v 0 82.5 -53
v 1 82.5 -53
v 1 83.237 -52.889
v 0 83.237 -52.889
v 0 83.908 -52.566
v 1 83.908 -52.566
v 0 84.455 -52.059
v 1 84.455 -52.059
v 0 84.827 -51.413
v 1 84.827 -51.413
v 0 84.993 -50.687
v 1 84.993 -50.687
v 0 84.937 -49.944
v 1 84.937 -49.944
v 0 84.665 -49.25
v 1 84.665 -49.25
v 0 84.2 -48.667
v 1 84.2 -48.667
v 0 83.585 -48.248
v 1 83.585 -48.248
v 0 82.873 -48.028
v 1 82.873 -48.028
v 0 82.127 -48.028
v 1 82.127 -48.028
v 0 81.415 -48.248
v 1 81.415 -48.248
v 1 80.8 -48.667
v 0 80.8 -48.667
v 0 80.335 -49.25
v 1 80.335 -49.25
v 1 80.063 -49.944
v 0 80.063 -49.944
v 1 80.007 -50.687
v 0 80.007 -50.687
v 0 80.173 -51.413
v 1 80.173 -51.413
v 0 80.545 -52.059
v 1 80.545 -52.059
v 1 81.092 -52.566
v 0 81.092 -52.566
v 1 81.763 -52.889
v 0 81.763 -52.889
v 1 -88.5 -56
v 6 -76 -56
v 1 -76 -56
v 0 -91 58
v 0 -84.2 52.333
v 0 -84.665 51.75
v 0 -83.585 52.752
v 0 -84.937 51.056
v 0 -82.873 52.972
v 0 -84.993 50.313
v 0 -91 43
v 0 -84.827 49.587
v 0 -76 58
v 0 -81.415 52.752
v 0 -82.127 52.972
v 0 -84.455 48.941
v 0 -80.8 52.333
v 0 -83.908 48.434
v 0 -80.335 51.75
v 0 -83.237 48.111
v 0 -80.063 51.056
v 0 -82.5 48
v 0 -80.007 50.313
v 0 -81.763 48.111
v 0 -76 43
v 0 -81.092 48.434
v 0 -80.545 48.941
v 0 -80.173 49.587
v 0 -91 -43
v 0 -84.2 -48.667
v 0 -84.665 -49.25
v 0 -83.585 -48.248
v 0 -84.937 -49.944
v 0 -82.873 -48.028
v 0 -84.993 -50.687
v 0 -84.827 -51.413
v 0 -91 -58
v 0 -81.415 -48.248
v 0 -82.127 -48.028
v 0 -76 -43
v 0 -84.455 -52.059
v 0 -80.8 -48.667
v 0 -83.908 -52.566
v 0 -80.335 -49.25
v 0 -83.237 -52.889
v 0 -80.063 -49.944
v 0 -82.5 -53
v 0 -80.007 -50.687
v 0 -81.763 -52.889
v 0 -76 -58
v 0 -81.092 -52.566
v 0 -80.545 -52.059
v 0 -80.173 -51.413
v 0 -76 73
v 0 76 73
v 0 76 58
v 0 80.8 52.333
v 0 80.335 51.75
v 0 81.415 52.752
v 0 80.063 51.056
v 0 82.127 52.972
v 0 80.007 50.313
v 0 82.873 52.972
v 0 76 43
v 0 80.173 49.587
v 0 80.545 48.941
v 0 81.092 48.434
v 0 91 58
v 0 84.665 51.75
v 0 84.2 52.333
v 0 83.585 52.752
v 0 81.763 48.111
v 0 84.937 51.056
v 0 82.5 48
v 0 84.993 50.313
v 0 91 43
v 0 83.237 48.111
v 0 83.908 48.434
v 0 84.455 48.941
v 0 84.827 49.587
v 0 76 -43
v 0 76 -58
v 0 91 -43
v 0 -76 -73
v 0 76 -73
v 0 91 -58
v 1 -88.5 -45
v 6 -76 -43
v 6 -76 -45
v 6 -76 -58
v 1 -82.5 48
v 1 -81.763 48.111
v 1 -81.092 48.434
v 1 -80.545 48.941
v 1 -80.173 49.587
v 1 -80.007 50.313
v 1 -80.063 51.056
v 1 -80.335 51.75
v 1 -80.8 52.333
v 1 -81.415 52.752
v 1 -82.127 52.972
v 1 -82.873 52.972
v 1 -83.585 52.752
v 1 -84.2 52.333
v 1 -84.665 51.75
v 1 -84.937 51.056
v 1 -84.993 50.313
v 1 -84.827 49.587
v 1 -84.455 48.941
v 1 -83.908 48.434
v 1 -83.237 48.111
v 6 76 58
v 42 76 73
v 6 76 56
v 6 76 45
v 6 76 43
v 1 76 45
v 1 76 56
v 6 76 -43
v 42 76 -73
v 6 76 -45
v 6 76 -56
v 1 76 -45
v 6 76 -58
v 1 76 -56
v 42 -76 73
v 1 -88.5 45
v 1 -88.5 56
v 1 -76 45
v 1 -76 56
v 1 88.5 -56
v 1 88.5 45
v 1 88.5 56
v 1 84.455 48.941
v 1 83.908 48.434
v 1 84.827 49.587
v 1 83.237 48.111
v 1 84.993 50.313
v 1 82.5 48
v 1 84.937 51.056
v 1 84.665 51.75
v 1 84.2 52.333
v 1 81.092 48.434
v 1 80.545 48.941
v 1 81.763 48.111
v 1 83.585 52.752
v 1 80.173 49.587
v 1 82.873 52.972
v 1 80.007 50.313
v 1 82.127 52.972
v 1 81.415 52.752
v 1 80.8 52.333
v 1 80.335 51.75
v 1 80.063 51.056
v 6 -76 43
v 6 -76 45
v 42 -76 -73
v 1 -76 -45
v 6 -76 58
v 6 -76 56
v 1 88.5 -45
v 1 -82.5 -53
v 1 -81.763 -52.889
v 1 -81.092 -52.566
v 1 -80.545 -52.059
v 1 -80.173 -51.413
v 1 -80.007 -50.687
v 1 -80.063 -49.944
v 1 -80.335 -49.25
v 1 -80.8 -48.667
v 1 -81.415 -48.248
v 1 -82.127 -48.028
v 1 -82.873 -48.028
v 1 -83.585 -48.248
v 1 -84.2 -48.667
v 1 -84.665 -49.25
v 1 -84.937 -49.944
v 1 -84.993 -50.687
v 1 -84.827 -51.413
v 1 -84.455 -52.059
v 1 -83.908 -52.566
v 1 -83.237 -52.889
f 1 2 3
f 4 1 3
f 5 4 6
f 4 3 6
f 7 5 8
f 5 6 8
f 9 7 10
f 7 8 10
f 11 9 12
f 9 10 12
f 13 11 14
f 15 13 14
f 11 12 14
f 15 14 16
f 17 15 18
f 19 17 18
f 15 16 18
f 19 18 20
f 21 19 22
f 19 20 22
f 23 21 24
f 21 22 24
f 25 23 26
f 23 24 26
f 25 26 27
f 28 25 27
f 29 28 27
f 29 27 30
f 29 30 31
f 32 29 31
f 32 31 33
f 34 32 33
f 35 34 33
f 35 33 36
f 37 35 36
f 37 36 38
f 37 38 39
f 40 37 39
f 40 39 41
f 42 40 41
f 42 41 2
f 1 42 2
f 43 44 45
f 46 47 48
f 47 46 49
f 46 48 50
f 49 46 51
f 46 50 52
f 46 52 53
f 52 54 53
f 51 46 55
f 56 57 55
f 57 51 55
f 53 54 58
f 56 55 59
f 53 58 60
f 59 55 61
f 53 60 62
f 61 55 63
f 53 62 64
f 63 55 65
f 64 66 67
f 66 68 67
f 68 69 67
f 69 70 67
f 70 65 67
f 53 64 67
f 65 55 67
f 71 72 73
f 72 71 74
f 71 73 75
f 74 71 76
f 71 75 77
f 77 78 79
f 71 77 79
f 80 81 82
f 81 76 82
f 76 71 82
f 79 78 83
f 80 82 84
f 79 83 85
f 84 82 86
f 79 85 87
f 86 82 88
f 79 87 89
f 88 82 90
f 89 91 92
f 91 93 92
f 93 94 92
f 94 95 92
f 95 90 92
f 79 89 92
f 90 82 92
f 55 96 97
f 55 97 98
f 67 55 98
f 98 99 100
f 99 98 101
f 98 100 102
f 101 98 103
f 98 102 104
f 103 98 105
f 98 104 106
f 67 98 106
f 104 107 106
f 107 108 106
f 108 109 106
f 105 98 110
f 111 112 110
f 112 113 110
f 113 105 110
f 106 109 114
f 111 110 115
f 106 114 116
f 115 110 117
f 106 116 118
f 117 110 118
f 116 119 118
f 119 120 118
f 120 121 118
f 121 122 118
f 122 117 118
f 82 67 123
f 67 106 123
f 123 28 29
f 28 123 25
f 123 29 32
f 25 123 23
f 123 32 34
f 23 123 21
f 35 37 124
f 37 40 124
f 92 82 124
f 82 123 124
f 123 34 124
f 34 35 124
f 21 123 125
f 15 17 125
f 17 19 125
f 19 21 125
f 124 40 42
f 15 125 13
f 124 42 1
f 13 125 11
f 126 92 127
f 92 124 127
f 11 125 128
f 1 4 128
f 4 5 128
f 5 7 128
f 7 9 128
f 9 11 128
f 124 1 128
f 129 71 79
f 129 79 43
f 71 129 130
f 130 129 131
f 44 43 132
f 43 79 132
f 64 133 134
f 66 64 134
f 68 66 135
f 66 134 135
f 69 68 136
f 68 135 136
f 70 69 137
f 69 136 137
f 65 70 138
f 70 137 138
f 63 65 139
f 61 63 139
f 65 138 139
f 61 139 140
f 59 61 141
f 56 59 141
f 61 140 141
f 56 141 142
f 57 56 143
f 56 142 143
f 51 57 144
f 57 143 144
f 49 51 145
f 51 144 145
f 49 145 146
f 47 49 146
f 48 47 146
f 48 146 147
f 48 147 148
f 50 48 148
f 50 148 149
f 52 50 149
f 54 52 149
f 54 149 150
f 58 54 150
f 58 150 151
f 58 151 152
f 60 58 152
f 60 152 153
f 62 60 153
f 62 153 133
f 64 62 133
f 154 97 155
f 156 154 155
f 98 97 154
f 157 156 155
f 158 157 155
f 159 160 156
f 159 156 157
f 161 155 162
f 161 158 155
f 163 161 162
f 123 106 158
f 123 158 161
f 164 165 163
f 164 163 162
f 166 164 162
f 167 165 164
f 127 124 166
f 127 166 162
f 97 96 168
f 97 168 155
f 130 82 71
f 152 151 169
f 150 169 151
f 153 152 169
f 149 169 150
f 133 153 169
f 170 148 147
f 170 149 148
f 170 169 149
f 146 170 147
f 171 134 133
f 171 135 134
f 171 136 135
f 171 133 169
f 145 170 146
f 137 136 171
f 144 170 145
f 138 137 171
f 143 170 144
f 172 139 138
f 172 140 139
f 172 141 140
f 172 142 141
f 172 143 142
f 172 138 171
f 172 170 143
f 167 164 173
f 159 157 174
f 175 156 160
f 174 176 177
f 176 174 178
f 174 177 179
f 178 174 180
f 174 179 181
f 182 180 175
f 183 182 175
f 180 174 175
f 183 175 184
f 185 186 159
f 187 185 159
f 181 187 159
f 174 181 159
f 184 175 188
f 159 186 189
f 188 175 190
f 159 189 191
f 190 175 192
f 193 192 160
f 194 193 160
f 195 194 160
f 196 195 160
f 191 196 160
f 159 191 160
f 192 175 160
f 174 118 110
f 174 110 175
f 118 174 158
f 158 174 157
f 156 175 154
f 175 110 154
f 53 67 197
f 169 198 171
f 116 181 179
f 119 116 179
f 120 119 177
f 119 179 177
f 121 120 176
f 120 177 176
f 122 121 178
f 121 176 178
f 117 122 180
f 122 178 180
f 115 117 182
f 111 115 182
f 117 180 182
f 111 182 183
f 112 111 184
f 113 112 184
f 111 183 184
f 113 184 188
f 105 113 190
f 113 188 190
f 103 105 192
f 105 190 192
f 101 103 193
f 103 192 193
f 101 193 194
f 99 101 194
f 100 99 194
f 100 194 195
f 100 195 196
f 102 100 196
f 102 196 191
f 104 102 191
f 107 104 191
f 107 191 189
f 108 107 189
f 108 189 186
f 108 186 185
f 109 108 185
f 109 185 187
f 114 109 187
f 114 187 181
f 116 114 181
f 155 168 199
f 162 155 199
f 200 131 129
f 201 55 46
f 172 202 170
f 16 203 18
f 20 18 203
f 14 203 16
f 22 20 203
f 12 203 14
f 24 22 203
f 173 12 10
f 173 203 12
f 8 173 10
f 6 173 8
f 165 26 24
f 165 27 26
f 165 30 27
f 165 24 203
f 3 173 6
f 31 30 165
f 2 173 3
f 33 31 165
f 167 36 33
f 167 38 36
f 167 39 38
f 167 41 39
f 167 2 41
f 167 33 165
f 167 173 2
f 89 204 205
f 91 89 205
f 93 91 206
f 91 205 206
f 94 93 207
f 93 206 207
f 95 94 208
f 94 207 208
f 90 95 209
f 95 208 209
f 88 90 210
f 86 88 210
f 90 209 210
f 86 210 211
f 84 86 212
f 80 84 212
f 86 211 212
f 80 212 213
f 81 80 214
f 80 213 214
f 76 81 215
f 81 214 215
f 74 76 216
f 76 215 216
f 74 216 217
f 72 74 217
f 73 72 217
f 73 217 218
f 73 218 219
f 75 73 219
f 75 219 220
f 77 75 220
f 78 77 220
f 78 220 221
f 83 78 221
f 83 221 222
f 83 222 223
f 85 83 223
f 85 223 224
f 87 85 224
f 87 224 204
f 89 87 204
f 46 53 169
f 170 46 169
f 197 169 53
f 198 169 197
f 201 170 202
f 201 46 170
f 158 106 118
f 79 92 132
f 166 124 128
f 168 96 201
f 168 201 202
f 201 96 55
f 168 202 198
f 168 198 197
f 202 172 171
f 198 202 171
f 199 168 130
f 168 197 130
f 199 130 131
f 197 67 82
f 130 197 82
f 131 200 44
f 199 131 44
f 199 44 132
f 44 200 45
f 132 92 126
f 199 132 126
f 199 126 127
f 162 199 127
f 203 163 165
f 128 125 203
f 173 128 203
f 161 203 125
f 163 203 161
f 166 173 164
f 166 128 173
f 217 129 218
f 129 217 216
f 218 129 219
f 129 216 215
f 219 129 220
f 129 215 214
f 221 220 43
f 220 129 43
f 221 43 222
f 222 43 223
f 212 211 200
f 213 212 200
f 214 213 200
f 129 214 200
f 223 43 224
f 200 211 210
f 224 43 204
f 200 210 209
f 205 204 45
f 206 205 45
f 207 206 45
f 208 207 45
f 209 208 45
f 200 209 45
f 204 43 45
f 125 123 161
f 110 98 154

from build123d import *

# Parameters (mm, degrees)
SKETCH_1_W            = 146
SKETCH_1_H            = 152
EXTRUDE_1_DEPTH       = 42
EXTRUDE_2_DEPTH       = 15
MIRROR_2_COPY_1_DEPTH = 15
CUT_EXTRUDE_START     = -2
CUT_EXTRUDE_1_DEPTH   = 11
MIRROR_START          = -2
MIRROR_4_COPY_1_DEPTH = 11
SKETCH_4_R            = 2.5
CUT_EXTRUDE_2_DEPTH   = 11


with BuildPart() as part:
    # 草图1 → 凸台-拉伸1 (new body)
    with BuildSketch(Plane(origin=(0, 0, 0), x_dir=(0, 0, -1), z_dir=(1, 0, 0))):
        Rectangle(SKETCH_1_W, SKETCH_1_H)
    extrude(amount=EXTRUDE_1_DEPTH)

    # 草图2 → 凸台-拉伸2 (add)
    with BuildSketch(Plane.XY.offset(58)):
        Polygon((0, -76), (0, -91), (6, -76), align=None)
    extrude_2 = extrude(amount=-EXTRUDE_2_DEPTH)

    # 镜向1: 凸台-拉伸2 across plane
    add(extrude_2.mirror(Plane(origin=(0, 0, 0), x_dir=(0, 0, 1), z_dir=(0, -1, 0))))

    # 镜向2: 凸台-拉伸2 across plane
    add(extrude_2.mirror(Plane(origin=(0, 0, 0), x_dir=(1, 0, 0), z_dir=(0, 0, -1))))

    # 镜向2 copy 1 sketch → 镜向2 copy 1 (add)
    with BuildSketch(Plane(origin=(0, 0, -58), x_dir=(1, 0, 0), z_dir=(0, 0, -1))):
        Polygon((0, -76), (0, -91), (6, -76), align=None)
    extrude(amount=-MIRROR_2_COPY_1_DEPTH)

    # 草图3 → 切除-拉伸1 (cut)
    with BuildSketch(Plane.XY.offset(58).offset(CUT_EXTRUDE_START)):
        Polygon((6, -76), (1, -88.5), (1, -76), align=None)
    cut_extrude_1 = extrude(amount=-CUT_EXTRUDE_1_DEPTH, mode=Mode.SUBTRACT)

    # 镜向3: 切除-拉伸1 across plane
    add(cut_extrude_1.mirror(Plane(origin=(0, 0, 0), x_dir=(1, 0, 0), z_dir=(0, 0, -1))), mode=Mode.SUBTRACT)

    # 镜向4: 切除-拉伸1 across plane
    add(cut_extrude_1.mirror(Plane(origin=(0, 0, 0), x_dir=(0, 0, 1), z_dir=(0, -1, 0))), mode=Mode.SUBTRACT)

    # 镜向4 copy 1 sketch → 镜向4 copy 1 (cut)
    with BuildSketch(Plane(origin=(0, 0, -58), x_dir=(1, 0, 0), z_dir=(0, 0, -1)).offset(MIRROR_START)):
        Polygon((6, -76), (1, -88.5), (1, -76), align=None)
    extrude(amount=-MIRROR_4_COPY_1_DEPTH, mode=Mode.SUBTRACT)

    # 草图4 → 切除-拉伸2 (cut)
    with BuildSketch(Plane(origin=(1, 0, 0), x_dir=(0, 0, -1), z_dir=(1, 0, 0))):
        with Locations((-50.5, -82.5)):
            Circle(SKETCH_4_R)
        with Locations((50.5, -82.5)):
            Circle(SKETCH_4_R)
        with Locations((-50.5, 82.5)):
            Circle(SKETCH_4_R)
        with Locations((50.5, 82.5)):
            Circle(SKETCH_4_R)
    extrude(amount=-CUT_EXTRUDE_2_DEPTH, mode=Mode.SUBTRACT)


solid = part.part
